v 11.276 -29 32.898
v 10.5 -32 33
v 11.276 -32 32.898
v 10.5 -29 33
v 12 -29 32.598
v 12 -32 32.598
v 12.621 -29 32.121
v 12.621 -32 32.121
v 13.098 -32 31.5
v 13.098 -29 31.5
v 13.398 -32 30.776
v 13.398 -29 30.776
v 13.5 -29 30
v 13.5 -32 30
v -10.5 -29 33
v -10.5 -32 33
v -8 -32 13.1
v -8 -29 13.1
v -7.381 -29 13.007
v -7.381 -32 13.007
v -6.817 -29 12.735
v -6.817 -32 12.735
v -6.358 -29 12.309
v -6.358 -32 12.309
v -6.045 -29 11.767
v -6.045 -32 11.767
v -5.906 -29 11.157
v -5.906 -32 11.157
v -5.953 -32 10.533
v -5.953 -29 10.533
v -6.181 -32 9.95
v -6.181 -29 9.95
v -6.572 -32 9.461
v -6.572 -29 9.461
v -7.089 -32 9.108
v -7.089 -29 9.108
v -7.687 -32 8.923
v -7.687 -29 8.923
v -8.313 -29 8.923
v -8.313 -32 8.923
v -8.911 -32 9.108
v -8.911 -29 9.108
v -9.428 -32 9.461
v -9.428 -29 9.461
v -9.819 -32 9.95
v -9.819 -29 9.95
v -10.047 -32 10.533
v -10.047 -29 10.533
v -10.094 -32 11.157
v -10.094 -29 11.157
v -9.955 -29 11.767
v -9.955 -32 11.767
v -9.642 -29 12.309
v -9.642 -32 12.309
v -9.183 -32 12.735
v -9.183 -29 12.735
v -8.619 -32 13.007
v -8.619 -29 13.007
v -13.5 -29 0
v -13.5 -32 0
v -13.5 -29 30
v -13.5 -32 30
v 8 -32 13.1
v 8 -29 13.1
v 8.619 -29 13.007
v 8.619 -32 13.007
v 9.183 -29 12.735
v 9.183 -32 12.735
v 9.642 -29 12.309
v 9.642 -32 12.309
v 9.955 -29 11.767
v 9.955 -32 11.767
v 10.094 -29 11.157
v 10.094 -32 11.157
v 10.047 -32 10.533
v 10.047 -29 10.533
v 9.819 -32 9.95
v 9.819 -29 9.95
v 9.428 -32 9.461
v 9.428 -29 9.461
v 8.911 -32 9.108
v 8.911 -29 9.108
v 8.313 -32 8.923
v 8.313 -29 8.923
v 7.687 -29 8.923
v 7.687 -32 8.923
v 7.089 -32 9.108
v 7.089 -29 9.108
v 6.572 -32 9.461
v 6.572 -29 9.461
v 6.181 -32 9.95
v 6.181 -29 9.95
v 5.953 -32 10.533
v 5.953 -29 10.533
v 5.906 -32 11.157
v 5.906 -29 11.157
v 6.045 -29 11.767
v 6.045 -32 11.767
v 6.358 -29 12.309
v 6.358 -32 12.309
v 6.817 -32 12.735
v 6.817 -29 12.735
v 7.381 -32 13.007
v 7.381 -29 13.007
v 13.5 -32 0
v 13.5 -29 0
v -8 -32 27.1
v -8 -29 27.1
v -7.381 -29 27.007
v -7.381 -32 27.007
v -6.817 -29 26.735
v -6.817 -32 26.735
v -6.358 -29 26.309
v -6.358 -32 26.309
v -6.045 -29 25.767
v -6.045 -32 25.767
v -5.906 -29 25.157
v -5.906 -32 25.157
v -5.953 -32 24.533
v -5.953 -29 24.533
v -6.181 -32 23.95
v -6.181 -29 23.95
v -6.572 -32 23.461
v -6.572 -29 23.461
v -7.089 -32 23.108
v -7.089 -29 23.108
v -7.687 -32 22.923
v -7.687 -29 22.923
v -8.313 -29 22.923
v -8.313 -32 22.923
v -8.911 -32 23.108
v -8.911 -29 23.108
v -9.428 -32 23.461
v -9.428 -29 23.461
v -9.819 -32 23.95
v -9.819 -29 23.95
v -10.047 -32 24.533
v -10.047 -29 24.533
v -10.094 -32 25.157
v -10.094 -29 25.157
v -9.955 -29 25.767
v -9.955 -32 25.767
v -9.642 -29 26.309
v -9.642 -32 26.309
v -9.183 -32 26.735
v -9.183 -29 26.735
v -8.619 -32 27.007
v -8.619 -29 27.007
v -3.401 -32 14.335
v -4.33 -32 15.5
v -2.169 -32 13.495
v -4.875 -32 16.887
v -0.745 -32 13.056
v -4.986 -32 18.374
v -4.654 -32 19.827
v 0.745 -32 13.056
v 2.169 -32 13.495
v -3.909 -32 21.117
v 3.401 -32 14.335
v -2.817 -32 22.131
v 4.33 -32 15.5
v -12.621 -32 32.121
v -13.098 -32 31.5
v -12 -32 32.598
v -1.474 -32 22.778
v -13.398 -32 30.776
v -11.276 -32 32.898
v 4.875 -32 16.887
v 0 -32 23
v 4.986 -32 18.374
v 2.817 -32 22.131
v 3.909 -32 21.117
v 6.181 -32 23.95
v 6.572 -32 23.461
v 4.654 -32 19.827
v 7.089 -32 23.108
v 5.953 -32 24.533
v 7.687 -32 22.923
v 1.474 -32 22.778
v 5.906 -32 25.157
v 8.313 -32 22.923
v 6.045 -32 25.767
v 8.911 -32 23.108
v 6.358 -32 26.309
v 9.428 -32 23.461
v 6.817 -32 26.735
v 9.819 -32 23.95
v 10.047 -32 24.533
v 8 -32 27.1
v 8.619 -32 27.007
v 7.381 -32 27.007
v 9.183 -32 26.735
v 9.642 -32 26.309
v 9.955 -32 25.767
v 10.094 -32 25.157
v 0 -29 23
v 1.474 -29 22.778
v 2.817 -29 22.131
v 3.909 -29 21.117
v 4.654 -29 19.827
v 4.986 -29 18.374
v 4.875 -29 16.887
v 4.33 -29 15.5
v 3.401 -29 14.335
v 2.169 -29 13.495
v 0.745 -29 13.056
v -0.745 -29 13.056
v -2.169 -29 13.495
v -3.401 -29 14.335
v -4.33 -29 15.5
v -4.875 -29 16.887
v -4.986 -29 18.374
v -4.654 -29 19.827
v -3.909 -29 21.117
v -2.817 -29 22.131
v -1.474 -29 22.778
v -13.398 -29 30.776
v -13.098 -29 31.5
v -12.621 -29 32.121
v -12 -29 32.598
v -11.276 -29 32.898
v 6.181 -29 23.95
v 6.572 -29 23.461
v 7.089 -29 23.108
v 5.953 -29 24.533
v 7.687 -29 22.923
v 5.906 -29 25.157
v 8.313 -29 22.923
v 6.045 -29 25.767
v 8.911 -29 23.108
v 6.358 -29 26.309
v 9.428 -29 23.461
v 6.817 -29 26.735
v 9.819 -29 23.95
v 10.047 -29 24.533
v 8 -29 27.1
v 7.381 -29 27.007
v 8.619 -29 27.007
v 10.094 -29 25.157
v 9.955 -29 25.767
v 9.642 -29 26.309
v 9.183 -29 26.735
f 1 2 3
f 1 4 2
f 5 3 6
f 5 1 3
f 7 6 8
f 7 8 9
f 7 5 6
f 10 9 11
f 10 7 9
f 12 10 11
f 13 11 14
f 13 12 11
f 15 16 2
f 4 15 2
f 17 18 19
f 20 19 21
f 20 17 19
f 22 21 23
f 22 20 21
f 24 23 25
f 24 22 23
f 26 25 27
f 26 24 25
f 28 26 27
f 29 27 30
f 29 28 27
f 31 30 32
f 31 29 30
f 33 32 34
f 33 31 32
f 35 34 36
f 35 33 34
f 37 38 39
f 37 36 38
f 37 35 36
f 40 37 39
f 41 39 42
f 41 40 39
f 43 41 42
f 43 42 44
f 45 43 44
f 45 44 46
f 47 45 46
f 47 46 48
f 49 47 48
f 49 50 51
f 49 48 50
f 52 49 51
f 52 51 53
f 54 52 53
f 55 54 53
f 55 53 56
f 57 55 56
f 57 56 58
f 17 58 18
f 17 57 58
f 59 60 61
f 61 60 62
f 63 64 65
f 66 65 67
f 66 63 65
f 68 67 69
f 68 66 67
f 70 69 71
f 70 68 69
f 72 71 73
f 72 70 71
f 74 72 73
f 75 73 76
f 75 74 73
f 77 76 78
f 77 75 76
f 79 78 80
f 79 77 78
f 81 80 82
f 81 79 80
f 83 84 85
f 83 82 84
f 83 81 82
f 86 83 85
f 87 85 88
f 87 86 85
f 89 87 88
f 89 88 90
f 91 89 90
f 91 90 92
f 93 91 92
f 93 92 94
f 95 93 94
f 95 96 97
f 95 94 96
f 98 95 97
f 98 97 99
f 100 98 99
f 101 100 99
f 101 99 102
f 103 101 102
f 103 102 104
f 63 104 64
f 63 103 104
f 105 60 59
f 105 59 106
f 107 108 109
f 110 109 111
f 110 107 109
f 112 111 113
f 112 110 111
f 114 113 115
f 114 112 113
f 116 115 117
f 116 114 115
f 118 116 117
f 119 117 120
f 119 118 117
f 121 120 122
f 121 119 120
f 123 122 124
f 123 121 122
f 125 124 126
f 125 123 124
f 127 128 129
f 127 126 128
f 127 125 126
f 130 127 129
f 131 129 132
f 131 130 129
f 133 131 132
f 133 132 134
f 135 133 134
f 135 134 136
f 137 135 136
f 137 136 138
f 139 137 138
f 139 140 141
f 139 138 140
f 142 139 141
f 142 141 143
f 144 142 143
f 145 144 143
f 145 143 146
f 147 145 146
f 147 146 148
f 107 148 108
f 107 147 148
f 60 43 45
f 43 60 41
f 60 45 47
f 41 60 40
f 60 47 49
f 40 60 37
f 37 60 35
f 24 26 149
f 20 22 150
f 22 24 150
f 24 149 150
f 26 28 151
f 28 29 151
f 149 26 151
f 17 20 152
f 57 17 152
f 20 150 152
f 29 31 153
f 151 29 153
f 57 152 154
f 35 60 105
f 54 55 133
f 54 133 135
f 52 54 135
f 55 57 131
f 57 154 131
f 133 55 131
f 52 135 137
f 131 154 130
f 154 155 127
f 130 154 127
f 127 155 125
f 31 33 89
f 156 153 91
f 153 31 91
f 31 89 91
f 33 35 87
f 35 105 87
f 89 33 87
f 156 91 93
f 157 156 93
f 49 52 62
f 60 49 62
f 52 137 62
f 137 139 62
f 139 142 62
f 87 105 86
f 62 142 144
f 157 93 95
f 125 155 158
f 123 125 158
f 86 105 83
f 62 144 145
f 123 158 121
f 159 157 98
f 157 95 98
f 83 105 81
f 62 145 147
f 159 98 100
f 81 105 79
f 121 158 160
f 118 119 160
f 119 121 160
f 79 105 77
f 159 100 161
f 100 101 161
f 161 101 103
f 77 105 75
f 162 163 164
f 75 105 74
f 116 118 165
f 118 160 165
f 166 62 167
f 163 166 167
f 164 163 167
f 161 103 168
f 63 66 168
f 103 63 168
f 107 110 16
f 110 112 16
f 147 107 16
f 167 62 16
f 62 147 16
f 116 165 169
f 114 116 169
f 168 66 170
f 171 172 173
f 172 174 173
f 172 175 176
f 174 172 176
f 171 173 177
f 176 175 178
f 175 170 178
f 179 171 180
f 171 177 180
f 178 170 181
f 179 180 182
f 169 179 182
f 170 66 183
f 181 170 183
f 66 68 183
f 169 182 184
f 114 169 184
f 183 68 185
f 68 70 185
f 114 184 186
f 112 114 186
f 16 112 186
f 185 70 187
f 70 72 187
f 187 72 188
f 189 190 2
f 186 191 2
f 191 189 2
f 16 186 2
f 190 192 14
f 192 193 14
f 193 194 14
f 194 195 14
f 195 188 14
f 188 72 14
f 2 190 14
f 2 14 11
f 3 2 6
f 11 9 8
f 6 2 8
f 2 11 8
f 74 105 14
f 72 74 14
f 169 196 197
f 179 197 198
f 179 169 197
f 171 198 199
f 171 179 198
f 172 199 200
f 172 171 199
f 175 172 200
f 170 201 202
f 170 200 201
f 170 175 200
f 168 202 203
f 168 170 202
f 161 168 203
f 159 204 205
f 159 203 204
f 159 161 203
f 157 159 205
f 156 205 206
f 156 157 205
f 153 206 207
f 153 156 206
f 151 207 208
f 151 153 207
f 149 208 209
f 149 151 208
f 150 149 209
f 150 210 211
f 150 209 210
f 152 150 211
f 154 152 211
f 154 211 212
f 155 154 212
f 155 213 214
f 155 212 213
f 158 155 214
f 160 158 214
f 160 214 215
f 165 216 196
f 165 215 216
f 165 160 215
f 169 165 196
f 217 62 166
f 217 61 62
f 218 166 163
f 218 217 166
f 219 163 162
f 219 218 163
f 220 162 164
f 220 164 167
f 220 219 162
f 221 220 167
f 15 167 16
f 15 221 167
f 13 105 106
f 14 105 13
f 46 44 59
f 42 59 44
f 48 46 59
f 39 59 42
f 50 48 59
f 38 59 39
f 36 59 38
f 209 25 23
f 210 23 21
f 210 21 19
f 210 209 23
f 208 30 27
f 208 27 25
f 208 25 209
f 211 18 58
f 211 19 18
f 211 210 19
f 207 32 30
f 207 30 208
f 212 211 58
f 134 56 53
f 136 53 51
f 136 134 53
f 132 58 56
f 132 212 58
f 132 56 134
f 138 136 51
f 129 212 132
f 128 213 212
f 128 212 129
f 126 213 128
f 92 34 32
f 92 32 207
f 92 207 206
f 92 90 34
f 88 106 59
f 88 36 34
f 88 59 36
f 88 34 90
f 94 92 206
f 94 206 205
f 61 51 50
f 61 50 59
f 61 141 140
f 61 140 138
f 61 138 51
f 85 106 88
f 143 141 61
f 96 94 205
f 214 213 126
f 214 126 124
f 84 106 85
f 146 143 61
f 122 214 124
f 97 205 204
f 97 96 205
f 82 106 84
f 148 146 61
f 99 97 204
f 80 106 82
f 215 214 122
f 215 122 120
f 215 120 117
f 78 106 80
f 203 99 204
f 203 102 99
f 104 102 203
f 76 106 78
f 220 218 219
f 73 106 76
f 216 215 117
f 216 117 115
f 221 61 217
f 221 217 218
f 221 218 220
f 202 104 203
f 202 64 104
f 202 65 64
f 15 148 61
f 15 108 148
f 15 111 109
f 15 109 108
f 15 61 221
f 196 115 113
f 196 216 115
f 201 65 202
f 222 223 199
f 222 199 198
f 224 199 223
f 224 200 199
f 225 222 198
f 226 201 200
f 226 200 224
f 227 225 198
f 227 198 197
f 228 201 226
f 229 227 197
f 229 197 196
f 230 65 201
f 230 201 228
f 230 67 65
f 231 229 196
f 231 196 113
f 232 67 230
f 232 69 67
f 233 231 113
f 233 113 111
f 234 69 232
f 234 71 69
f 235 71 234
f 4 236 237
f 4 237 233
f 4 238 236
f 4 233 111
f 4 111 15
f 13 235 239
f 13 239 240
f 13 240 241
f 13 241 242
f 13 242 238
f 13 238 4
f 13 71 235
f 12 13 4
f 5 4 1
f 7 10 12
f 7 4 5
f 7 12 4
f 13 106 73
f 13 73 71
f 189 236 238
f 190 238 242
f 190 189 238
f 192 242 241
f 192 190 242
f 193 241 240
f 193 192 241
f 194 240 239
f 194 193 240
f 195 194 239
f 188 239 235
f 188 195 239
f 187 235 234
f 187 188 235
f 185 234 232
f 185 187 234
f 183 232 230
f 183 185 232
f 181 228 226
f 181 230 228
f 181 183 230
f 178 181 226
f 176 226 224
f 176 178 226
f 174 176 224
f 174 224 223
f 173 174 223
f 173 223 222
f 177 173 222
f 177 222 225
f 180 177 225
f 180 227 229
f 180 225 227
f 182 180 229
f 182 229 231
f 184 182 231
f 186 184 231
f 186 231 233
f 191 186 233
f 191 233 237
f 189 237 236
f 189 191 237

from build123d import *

# Parameters (mm, degrees)
CYLINDER008_R          = 5
CYLINDER008_DEPTH      = 10
CYLINDER007_R          = 2.1
CYLINDER007_DEPTH      = 10
ARRAY001_X_COUNT       = 2
ARRAY001_X_PITCH       = 14
ARRAY001_Y_COUNT       = 2
ARRAY001_Y_PITCH       = 16
BOX006_W               = 33
BOX006_H               = 27
BOX006_DEPTH           = 3
FILLET002_R            = 3
CUT004_PITCH_ANGLE     = -90
CUT004_PLACEMENT_ANGLE = -90


with BuildPart() as motor_holder_central_hole:
    # Cylinder008 → Cylinder008 (new body)
    with BuildSketch(Plane(origin=(18, 13.5, 0), x_dir=(1, 0, 0), z_dir=(0, 0, 1))):
        Circle(CYLINDER008_R)
    extrude(amount=CYLINDER008_DEPTH)


with BuildPart() as hole_extract:
    # Cylinder007 → Cylinder007 (new body)
    with BuildSketch(Plane.XY):
        Circle(CYLINDER007_R)
    extrude(amount=CYLINDER007_DEPTH)

    # Array001 X: hole extract ×2


with BuildPart() as hole_extract_1:
    add(hole_extract.part)
    with Locations(*[(i * ARRAY001_X_PITCH, 0, 0) for i in range(1, ARRAY001_X_COUNT)]):
        add(hole_extract.part)

    # Array001 Y: hole extract ×2


with BuildPart() as hole_extract_2:
    add(hole_extract_1.part)
    with Locations(*[(0, i * ARRAY001_Y_PITCH, 0) for i in range(1, ARRAY001_Y_COUNT)]):
        add(hole_extract_1.part)


with BuildPart() as hole_extract_3:
    # Array001 placement: moved
    add(hole_extract_2.part.moved(Location((11, 5.5, 0))))

    # Fusion008: union motor holder central hole
    add(motor_holder_central_hole.part)


with BuildPart() as motor_holder_cut001:
    # Box006 → Box006 (new body)
    with BuildSketch(Plane.XY):
        with Locations((16.5, 13.5)):
            Rectangle(BOX006_W, BOX006_H)
    extrude(amount=BOX006_DEPTH)

    # Fillet002
    fillet002_edges = [motor_holder_cut001.edges().sort_by_distance(p)[0] for p in [
        (33, 0, 1.5),
        (33, 27, 1.5),
    ]]
    fillet(fillet002_edges, radius=FILLET002_R)

    # Cut004: cut hole extract
    add(hole_extract_3.part, mode=Mode.SUBTRACT)


with BuildPart() as motor_holder_cut001_1:
    # Cut004 pitch: moved
    add(motor_holder_cut001.part.rotate(Axis((0, 0, 0), (0, 1, 0)), CUT004_PITCH_ANGLE))


with BuildPart() as motor_holder_cut001_2:
    # Cut004 placement: moved
    add(motor_holder_cut001_1.part.moved(Location((-13.5, -34, 0))).rotate(Axis((-13.5, -34, 0), (0, 0, 1)), CUT004_PLACEMENT_ANGLE))


with BuildPart() as motor_holder_cut001_3:
    # Cut004001 placement: moved
    add(motor_holder_cut001_2.part.moved(Location((0, 2, 0))))


solid = motor_holder_cut001_3.part
